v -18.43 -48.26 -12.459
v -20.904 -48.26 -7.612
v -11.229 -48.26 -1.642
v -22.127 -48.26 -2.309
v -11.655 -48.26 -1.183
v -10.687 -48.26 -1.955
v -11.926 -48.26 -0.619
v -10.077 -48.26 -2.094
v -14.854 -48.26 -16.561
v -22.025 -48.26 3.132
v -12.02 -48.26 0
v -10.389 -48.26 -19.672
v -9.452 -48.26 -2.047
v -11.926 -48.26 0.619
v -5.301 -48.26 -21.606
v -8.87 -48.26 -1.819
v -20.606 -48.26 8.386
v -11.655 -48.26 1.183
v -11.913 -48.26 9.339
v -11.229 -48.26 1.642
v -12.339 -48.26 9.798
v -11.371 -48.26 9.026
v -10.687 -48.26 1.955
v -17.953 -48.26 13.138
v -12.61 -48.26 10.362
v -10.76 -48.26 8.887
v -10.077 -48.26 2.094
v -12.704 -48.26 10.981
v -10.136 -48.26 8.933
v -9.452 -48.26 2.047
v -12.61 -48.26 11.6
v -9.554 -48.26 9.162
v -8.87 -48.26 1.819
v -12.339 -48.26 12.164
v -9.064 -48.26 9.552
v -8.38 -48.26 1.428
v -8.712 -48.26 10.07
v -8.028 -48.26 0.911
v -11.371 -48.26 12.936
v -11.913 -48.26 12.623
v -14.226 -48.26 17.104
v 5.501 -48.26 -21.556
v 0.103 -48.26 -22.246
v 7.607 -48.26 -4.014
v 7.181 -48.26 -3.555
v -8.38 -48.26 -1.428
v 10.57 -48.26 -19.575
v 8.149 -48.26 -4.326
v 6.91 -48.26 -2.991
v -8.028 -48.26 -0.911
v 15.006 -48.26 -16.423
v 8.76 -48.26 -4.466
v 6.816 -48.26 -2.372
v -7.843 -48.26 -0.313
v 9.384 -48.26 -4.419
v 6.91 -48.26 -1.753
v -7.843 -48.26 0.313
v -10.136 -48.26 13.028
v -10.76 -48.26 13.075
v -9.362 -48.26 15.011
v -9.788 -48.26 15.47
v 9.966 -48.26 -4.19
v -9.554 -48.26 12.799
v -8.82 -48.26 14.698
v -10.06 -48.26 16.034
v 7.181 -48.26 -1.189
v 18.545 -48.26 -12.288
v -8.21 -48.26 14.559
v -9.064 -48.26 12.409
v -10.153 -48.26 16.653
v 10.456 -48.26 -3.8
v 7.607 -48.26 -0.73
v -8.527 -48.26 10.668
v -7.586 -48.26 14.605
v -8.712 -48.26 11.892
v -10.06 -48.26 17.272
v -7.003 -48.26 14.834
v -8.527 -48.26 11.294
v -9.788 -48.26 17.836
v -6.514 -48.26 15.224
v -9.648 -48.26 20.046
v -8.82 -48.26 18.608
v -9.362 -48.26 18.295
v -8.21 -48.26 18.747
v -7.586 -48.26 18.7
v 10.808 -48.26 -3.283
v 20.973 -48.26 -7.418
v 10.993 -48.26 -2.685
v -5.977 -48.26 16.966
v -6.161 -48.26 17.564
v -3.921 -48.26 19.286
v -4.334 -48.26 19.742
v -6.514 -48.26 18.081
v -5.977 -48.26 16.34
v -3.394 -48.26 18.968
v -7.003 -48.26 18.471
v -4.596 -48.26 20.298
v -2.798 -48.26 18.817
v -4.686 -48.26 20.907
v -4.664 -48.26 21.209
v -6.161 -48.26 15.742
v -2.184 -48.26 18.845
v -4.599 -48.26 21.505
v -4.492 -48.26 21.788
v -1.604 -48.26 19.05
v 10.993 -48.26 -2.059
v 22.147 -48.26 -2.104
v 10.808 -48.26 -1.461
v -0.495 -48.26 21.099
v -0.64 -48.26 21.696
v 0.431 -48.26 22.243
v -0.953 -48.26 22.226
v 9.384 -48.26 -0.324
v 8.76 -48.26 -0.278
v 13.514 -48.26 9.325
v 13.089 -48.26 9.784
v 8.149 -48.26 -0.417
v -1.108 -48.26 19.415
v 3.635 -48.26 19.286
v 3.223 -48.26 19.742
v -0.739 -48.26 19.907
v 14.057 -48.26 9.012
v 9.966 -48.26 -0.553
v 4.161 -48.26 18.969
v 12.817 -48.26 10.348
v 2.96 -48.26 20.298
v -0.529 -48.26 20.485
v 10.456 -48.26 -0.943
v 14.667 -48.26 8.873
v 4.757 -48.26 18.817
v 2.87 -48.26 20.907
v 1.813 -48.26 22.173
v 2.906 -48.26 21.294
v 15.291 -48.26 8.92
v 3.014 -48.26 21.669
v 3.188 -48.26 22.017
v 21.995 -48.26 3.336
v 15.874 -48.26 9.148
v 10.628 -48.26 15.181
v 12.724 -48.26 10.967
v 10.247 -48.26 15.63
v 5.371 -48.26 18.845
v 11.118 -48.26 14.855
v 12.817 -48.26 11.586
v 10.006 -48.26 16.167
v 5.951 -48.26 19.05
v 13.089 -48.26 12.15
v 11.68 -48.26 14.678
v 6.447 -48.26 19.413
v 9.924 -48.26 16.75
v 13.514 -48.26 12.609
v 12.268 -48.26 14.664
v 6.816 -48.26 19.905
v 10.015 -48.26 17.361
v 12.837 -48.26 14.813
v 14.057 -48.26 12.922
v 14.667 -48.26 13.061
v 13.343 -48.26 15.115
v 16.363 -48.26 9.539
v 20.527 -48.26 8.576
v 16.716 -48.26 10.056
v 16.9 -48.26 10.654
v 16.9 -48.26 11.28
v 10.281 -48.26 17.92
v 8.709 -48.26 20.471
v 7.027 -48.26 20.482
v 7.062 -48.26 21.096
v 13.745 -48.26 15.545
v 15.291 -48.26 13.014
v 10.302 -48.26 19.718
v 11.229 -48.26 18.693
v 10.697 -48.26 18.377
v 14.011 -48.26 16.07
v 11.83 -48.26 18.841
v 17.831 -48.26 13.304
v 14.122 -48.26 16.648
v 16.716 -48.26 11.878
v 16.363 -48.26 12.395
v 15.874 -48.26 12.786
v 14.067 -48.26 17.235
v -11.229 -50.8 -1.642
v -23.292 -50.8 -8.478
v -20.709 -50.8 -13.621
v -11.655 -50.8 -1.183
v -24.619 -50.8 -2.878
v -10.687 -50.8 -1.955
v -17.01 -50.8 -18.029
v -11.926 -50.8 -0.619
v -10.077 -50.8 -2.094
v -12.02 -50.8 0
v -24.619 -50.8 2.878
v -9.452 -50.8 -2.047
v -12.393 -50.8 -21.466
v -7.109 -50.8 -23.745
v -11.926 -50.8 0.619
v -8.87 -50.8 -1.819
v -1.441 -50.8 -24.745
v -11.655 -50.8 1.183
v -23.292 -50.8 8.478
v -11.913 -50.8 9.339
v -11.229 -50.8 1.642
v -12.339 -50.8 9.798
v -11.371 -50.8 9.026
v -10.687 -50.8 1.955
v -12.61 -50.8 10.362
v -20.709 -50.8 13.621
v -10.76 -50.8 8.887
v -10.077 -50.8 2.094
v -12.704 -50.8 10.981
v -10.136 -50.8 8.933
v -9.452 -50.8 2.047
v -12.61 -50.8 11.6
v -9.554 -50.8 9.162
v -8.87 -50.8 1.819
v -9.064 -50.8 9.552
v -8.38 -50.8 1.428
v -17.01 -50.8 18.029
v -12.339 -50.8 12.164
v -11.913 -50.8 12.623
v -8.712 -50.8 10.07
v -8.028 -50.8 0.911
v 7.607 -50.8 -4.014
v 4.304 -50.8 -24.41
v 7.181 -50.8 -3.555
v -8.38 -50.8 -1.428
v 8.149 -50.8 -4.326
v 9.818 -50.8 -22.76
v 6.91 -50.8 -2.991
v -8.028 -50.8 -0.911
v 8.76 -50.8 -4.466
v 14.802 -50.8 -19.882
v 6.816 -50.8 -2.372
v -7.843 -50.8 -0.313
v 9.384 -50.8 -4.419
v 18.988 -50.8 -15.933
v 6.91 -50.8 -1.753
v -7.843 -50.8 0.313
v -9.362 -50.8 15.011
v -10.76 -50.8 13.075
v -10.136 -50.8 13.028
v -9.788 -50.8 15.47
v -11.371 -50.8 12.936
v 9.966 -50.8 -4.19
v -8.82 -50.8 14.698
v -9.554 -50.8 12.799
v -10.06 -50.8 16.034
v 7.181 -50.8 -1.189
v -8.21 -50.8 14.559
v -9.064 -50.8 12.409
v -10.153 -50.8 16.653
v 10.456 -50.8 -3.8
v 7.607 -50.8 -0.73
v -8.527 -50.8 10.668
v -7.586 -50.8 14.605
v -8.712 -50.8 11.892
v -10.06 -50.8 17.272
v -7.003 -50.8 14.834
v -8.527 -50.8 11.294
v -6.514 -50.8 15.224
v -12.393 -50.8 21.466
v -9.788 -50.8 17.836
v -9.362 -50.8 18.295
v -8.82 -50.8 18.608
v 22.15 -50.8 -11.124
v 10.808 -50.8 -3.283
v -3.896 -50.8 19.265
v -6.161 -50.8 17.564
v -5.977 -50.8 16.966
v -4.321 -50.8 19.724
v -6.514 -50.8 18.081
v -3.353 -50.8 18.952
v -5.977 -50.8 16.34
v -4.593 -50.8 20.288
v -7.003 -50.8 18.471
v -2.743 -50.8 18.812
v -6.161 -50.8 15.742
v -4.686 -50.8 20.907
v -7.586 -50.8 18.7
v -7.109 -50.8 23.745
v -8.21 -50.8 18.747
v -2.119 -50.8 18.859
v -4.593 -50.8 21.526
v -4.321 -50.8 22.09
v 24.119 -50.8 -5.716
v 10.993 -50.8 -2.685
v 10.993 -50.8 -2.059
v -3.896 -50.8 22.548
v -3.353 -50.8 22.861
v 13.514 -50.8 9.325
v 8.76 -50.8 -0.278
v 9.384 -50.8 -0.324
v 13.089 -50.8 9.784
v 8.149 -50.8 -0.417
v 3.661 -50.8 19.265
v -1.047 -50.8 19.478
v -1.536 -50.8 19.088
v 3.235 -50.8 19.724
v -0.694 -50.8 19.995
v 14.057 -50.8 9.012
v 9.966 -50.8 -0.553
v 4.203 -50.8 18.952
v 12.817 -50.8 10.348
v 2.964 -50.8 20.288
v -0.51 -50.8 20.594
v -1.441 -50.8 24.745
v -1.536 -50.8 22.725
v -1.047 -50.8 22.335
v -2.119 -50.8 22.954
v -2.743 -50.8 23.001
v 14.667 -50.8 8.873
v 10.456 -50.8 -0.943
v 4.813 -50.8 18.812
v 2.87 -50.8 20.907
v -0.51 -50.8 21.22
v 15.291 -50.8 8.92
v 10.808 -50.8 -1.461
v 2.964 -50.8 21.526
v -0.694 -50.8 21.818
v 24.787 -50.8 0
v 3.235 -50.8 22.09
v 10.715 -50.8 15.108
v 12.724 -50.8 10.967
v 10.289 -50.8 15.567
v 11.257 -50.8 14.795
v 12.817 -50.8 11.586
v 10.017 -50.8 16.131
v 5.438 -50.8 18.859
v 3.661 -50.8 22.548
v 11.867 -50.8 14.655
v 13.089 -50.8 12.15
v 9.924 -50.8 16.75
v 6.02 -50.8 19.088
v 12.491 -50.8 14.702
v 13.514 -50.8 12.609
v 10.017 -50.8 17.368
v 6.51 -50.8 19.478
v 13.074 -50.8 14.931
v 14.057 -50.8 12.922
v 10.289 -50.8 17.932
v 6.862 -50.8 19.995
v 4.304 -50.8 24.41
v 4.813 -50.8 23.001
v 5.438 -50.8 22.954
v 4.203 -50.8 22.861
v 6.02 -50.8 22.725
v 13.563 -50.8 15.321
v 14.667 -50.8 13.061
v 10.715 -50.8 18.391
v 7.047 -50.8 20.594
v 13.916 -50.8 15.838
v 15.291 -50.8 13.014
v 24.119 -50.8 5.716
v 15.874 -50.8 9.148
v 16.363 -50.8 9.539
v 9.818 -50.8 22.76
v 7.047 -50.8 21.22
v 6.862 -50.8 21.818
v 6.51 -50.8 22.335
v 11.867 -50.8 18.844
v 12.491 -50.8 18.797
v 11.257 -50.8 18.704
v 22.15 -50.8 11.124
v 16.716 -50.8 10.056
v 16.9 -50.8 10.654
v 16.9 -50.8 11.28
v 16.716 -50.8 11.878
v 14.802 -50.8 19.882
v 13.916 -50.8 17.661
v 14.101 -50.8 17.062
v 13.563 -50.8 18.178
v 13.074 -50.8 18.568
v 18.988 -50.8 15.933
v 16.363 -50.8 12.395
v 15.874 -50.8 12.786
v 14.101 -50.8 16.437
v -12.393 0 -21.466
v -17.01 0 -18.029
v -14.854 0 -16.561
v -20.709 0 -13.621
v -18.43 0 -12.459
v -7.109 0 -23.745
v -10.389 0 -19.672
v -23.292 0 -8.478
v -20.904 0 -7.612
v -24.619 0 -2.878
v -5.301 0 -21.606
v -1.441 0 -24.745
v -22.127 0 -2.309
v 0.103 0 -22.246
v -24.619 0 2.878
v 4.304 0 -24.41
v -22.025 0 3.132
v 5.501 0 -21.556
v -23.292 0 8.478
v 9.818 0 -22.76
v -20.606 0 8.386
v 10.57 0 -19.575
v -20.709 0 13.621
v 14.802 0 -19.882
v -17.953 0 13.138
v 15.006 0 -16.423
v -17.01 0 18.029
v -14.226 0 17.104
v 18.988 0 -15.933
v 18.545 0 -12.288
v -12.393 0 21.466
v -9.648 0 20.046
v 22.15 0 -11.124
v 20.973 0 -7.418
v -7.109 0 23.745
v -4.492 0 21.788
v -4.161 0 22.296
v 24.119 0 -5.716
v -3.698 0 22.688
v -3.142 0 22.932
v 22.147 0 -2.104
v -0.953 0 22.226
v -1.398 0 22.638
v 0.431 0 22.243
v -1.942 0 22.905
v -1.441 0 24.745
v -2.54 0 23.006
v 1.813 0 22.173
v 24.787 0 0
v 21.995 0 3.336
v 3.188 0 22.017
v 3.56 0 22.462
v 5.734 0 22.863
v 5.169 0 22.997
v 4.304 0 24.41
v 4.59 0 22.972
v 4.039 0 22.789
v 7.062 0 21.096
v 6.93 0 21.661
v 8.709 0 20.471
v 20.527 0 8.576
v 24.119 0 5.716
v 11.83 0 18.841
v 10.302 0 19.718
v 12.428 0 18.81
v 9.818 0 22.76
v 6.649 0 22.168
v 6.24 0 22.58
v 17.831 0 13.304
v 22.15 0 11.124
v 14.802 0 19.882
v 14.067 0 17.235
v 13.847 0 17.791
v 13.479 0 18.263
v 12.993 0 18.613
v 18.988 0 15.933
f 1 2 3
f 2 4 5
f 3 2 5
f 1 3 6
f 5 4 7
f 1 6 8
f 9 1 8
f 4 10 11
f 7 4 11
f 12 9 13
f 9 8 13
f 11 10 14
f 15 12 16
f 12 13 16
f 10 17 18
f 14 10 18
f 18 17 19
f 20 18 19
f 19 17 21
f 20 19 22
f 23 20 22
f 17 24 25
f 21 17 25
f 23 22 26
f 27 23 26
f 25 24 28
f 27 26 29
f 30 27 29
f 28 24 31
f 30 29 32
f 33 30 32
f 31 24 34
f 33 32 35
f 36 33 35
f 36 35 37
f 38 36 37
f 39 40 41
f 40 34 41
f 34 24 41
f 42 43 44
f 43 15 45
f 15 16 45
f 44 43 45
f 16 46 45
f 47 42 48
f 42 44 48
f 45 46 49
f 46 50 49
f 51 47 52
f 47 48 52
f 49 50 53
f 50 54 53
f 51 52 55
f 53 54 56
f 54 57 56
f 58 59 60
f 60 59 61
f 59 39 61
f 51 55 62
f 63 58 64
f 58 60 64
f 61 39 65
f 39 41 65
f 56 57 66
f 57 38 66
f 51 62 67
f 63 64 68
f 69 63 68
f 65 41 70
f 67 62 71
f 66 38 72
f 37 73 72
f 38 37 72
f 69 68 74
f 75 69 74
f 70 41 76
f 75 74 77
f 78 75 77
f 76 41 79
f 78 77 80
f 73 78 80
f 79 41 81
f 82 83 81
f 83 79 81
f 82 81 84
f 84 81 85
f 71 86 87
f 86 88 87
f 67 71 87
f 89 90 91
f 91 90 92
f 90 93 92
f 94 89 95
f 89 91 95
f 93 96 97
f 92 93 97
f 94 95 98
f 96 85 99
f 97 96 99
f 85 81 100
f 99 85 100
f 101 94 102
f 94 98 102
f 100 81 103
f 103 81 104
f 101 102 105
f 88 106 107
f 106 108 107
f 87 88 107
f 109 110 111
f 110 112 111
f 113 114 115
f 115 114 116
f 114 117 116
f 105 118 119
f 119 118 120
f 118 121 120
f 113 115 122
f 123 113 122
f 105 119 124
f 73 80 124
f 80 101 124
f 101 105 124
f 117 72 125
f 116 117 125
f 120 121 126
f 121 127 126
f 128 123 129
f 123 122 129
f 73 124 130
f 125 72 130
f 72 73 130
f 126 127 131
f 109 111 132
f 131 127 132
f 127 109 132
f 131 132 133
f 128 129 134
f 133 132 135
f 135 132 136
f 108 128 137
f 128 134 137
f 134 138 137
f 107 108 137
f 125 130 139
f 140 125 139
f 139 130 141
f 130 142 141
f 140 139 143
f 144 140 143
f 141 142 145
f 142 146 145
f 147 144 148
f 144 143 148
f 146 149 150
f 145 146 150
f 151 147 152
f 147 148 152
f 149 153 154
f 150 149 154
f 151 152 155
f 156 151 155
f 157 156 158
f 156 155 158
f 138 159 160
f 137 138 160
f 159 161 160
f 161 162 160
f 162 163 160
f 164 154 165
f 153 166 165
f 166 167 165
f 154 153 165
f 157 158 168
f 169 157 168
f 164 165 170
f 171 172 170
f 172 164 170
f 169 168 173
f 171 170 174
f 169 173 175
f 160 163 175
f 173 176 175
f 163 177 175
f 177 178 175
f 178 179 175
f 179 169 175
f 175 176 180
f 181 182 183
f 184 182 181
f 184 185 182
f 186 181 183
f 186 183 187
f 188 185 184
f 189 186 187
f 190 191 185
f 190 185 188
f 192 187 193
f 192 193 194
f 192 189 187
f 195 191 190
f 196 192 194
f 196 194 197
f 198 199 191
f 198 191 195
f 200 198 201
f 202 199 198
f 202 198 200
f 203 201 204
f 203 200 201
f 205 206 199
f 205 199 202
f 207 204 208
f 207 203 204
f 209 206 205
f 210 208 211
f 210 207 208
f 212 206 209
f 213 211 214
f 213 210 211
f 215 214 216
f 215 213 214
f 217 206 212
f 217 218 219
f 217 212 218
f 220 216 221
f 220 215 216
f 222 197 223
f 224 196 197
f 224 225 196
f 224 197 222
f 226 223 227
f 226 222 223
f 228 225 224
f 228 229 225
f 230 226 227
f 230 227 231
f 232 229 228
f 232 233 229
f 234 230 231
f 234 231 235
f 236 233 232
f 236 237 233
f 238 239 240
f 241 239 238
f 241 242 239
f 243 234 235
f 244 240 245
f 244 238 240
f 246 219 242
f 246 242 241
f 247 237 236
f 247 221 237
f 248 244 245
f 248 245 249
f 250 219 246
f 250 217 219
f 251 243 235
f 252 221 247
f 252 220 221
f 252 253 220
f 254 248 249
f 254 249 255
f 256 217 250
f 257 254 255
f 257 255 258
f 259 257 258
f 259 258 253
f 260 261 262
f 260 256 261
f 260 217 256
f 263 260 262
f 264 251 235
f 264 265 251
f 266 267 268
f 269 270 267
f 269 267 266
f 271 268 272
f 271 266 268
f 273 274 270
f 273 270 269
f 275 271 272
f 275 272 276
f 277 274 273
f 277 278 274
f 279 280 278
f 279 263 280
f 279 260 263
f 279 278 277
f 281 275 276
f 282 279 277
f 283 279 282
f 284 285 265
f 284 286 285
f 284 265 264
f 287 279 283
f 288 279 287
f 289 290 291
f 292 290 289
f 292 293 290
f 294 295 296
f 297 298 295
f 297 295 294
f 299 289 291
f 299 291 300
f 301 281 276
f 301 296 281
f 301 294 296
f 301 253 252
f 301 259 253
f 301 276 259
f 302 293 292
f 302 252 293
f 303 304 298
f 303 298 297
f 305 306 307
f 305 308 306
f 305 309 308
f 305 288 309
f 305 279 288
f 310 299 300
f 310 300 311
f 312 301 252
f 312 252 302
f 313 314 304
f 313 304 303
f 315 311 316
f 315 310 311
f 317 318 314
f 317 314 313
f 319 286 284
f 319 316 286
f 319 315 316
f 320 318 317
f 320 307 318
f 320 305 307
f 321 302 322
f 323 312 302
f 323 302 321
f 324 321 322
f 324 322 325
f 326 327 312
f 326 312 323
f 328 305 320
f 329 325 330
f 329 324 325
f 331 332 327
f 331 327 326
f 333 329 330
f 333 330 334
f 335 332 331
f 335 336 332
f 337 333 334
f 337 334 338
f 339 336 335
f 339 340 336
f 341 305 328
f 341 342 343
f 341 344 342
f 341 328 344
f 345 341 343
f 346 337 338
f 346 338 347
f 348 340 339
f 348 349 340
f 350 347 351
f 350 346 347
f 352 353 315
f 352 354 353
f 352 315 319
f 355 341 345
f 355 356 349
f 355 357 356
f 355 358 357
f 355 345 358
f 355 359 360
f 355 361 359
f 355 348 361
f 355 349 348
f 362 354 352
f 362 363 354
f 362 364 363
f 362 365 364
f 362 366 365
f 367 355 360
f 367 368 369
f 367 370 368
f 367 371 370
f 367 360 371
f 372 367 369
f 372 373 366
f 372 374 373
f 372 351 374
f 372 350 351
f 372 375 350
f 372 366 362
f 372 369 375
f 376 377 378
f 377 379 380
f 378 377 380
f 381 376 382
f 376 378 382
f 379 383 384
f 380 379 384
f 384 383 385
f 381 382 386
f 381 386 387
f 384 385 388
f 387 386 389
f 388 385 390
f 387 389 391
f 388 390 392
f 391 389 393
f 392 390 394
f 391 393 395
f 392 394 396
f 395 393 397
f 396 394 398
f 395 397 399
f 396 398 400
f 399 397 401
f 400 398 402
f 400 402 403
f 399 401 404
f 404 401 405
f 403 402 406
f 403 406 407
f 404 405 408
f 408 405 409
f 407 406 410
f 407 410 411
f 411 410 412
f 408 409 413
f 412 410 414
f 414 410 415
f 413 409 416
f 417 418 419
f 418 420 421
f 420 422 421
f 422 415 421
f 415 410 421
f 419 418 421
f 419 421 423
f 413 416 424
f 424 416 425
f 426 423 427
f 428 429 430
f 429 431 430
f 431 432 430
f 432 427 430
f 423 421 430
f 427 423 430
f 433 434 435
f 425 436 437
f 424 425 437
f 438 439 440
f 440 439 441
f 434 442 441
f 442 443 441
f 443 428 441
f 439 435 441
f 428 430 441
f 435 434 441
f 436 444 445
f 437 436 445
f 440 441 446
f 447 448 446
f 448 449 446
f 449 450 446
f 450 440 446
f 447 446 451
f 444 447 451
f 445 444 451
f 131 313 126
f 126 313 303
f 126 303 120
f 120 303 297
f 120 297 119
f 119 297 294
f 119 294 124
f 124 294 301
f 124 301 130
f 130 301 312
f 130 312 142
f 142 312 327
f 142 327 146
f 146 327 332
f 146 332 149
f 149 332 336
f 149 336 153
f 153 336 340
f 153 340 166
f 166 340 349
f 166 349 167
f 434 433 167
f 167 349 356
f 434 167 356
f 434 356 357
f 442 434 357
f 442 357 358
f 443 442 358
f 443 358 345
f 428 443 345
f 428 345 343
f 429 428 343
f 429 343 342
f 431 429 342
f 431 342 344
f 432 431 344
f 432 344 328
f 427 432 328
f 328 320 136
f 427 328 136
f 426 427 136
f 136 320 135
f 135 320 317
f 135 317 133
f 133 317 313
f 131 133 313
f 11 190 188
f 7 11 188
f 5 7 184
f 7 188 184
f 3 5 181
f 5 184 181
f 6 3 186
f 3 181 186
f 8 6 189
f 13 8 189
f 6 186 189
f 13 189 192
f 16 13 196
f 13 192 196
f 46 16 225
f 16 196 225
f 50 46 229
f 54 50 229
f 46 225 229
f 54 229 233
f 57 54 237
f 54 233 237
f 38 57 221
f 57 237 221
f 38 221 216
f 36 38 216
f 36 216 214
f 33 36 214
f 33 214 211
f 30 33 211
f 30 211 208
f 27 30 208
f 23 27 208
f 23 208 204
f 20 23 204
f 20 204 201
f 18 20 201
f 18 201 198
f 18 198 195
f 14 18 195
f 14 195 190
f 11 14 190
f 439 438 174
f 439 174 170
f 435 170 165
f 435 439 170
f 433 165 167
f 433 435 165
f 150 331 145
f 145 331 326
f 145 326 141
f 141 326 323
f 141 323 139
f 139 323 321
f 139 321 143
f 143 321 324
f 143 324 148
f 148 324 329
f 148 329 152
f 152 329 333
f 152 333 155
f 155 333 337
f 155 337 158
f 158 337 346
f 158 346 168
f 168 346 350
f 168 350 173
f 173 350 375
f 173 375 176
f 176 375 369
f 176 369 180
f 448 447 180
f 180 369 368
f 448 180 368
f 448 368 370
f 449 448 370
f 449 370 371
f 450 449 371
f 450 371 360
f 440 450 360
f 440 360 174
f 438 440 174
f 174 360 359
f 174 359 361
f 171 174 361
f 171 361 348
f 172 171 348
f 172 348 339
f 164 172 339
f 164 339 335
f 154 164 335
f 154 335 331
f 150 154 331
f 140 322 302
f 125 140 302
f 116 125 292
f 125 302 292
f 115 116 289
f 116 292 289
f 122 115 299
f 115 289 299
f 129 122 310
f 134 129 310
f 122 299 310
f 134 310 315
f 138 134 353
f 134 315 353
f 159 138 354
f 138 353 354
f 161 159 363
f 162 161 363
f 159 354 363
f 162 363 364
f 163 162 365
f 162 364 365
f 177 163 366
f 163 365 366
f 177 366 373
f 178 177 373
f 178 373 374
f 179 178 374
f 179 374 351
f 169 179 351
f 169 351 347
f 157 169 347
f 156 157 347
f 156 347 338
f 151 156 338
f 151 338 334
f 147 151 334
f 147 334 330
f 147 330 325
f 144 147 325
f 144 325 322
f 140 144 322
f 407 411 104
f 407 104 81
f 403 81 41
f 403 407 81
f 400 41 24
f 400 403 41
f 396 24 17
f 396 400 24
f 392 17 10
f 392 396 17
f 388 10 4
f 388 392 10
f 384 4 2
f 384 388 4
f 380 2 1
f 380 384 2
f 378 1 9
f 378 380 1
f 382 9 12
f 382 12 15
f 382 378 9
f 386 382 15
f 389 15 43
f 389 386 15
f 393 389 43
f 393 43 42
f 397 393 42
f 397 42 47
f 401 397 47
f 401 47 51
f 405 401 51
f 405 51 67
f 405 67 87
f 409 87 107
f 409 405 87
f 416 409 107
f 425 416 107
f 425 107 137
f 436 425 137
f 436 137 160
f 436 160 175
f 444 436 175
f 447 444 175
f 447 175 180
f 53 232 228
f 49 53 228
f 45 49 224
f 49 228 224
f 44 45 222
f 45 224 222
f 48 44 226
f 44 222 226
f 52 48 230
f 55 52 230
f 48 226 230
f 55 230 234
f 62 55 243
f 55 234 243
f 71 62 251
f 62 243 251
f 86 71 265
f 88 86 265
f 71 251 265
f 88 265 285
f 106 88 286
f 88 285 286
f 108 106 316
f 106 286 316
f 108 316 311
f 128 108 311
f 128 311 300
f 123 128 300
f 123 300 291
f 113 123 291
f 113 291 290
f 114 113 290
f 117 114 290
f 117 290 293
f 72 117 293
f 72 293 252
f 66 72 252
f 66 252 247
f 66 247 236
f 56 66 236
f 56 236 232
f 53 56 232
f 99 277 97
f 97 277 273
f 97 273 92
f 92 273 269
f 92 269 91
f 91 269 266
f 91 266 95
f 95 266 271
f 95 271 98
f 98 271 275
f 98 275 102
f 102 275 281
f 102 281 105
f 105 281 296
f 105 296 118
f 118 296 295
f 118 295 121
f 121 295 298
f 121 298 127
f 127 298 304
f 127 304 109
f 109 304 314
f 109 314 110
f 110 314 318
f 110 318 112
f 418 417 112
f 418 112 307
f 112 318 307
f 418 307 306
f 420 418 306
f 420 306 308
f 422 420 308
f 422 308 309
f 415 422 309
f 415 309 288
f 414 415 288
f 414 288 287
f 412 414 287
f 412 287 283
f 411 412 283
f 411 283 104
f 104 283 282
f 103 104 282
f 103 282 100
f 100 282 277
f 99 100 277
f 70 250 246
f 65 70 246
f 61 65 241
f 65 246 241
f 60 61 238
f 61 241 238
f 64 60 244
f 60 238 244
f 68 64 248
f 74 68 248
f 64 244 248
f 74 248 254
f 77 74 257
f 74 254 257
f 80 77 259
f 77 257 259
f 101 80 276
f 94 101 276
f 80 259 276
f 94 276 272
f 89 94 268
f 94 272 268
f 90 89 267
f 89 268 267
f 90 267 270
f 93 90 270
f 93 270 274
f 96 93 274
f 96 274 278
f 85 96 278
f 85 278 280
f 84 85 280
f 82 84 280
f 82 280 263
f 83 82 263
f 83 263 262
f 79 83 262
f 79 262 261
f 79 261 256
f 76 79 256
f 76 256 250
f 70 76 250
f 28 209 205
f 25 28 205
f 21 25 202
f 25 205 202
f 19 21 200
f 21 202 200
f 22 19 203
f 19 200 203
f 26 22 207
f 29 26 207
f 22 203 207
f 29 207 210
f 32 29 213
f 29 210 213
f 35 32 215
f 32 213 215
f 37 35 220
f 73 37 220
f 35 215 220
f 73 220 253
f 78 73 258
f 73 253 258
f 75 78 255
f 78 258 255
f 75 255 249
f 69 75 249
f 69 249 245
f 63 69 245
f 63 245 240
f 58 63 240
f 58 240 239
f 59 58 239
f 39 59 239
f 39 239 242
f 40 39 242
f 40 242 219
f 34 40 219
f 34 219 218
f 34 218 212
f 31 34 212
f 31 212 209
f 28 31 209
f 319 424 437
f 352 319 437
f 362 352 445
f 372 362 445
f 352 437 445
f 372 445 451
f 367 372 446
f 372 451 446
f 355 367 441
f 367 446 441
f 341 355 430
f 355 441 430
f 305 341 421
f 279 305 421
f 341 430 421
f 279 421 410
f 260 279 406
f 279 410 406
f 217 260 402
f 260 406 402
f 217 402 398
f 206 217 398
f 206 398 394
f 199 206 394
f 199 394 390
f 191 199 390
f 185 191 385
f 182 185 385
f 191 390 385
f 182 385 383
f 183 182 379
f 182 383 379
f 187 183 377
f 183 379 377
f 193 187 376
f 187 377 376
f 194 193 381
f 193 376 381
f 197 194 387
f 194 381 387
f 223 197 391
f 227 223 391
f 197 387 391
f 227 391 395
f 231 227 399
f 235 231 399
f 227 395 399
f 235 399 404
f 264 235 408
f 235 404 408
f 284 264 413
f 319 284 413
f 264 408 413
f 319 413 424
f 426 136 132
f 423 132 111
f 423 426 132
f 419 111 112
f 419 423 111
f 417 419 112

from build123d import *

# Parameters (mm, degrees)
F0_R     = 24.7867182939
F1_DEPTH = 50.8
F2_T     = -2.54
F7_D     = 4.2


# Not quite as in the source:
# - a feature of the source that left no trace in its solid (it failed there, or was rolled back) is left out


with BuildPart() as f1:
    # F0 (on Front) → F1 (new body)
    with BuildSketch(Plane.XZ):
        Circle(F0_R)
    extrude(amount=F1_DEPTH)

    # F2
    f2_openings = [f1.faces().sort_by_distance(p)[0] for p in [
        (0, 0, 0),
    ]]
    offset(amount=F2_T, openings=f2_openings)

    # F7 (through all)
    with Locations(Plane(origin=(0, 0, 0), x_dir=(1, 0, 0), z_dir=(0, 1, 0))):
        with Locations((8.9164366946, 2.3716597352), (14.8237738758, -10.9670488164), (12.0239807293, -16.7495105416), (4.9703707919, -20.9065452218), (-2.5862243492, -20.9065452218), (-8.0531220883, -16.6528206319), (-10.6035573408, -10.9806992114), (-9.9196853116, 0)):
            Hole(F7_D / 2)


solid = f1.part
